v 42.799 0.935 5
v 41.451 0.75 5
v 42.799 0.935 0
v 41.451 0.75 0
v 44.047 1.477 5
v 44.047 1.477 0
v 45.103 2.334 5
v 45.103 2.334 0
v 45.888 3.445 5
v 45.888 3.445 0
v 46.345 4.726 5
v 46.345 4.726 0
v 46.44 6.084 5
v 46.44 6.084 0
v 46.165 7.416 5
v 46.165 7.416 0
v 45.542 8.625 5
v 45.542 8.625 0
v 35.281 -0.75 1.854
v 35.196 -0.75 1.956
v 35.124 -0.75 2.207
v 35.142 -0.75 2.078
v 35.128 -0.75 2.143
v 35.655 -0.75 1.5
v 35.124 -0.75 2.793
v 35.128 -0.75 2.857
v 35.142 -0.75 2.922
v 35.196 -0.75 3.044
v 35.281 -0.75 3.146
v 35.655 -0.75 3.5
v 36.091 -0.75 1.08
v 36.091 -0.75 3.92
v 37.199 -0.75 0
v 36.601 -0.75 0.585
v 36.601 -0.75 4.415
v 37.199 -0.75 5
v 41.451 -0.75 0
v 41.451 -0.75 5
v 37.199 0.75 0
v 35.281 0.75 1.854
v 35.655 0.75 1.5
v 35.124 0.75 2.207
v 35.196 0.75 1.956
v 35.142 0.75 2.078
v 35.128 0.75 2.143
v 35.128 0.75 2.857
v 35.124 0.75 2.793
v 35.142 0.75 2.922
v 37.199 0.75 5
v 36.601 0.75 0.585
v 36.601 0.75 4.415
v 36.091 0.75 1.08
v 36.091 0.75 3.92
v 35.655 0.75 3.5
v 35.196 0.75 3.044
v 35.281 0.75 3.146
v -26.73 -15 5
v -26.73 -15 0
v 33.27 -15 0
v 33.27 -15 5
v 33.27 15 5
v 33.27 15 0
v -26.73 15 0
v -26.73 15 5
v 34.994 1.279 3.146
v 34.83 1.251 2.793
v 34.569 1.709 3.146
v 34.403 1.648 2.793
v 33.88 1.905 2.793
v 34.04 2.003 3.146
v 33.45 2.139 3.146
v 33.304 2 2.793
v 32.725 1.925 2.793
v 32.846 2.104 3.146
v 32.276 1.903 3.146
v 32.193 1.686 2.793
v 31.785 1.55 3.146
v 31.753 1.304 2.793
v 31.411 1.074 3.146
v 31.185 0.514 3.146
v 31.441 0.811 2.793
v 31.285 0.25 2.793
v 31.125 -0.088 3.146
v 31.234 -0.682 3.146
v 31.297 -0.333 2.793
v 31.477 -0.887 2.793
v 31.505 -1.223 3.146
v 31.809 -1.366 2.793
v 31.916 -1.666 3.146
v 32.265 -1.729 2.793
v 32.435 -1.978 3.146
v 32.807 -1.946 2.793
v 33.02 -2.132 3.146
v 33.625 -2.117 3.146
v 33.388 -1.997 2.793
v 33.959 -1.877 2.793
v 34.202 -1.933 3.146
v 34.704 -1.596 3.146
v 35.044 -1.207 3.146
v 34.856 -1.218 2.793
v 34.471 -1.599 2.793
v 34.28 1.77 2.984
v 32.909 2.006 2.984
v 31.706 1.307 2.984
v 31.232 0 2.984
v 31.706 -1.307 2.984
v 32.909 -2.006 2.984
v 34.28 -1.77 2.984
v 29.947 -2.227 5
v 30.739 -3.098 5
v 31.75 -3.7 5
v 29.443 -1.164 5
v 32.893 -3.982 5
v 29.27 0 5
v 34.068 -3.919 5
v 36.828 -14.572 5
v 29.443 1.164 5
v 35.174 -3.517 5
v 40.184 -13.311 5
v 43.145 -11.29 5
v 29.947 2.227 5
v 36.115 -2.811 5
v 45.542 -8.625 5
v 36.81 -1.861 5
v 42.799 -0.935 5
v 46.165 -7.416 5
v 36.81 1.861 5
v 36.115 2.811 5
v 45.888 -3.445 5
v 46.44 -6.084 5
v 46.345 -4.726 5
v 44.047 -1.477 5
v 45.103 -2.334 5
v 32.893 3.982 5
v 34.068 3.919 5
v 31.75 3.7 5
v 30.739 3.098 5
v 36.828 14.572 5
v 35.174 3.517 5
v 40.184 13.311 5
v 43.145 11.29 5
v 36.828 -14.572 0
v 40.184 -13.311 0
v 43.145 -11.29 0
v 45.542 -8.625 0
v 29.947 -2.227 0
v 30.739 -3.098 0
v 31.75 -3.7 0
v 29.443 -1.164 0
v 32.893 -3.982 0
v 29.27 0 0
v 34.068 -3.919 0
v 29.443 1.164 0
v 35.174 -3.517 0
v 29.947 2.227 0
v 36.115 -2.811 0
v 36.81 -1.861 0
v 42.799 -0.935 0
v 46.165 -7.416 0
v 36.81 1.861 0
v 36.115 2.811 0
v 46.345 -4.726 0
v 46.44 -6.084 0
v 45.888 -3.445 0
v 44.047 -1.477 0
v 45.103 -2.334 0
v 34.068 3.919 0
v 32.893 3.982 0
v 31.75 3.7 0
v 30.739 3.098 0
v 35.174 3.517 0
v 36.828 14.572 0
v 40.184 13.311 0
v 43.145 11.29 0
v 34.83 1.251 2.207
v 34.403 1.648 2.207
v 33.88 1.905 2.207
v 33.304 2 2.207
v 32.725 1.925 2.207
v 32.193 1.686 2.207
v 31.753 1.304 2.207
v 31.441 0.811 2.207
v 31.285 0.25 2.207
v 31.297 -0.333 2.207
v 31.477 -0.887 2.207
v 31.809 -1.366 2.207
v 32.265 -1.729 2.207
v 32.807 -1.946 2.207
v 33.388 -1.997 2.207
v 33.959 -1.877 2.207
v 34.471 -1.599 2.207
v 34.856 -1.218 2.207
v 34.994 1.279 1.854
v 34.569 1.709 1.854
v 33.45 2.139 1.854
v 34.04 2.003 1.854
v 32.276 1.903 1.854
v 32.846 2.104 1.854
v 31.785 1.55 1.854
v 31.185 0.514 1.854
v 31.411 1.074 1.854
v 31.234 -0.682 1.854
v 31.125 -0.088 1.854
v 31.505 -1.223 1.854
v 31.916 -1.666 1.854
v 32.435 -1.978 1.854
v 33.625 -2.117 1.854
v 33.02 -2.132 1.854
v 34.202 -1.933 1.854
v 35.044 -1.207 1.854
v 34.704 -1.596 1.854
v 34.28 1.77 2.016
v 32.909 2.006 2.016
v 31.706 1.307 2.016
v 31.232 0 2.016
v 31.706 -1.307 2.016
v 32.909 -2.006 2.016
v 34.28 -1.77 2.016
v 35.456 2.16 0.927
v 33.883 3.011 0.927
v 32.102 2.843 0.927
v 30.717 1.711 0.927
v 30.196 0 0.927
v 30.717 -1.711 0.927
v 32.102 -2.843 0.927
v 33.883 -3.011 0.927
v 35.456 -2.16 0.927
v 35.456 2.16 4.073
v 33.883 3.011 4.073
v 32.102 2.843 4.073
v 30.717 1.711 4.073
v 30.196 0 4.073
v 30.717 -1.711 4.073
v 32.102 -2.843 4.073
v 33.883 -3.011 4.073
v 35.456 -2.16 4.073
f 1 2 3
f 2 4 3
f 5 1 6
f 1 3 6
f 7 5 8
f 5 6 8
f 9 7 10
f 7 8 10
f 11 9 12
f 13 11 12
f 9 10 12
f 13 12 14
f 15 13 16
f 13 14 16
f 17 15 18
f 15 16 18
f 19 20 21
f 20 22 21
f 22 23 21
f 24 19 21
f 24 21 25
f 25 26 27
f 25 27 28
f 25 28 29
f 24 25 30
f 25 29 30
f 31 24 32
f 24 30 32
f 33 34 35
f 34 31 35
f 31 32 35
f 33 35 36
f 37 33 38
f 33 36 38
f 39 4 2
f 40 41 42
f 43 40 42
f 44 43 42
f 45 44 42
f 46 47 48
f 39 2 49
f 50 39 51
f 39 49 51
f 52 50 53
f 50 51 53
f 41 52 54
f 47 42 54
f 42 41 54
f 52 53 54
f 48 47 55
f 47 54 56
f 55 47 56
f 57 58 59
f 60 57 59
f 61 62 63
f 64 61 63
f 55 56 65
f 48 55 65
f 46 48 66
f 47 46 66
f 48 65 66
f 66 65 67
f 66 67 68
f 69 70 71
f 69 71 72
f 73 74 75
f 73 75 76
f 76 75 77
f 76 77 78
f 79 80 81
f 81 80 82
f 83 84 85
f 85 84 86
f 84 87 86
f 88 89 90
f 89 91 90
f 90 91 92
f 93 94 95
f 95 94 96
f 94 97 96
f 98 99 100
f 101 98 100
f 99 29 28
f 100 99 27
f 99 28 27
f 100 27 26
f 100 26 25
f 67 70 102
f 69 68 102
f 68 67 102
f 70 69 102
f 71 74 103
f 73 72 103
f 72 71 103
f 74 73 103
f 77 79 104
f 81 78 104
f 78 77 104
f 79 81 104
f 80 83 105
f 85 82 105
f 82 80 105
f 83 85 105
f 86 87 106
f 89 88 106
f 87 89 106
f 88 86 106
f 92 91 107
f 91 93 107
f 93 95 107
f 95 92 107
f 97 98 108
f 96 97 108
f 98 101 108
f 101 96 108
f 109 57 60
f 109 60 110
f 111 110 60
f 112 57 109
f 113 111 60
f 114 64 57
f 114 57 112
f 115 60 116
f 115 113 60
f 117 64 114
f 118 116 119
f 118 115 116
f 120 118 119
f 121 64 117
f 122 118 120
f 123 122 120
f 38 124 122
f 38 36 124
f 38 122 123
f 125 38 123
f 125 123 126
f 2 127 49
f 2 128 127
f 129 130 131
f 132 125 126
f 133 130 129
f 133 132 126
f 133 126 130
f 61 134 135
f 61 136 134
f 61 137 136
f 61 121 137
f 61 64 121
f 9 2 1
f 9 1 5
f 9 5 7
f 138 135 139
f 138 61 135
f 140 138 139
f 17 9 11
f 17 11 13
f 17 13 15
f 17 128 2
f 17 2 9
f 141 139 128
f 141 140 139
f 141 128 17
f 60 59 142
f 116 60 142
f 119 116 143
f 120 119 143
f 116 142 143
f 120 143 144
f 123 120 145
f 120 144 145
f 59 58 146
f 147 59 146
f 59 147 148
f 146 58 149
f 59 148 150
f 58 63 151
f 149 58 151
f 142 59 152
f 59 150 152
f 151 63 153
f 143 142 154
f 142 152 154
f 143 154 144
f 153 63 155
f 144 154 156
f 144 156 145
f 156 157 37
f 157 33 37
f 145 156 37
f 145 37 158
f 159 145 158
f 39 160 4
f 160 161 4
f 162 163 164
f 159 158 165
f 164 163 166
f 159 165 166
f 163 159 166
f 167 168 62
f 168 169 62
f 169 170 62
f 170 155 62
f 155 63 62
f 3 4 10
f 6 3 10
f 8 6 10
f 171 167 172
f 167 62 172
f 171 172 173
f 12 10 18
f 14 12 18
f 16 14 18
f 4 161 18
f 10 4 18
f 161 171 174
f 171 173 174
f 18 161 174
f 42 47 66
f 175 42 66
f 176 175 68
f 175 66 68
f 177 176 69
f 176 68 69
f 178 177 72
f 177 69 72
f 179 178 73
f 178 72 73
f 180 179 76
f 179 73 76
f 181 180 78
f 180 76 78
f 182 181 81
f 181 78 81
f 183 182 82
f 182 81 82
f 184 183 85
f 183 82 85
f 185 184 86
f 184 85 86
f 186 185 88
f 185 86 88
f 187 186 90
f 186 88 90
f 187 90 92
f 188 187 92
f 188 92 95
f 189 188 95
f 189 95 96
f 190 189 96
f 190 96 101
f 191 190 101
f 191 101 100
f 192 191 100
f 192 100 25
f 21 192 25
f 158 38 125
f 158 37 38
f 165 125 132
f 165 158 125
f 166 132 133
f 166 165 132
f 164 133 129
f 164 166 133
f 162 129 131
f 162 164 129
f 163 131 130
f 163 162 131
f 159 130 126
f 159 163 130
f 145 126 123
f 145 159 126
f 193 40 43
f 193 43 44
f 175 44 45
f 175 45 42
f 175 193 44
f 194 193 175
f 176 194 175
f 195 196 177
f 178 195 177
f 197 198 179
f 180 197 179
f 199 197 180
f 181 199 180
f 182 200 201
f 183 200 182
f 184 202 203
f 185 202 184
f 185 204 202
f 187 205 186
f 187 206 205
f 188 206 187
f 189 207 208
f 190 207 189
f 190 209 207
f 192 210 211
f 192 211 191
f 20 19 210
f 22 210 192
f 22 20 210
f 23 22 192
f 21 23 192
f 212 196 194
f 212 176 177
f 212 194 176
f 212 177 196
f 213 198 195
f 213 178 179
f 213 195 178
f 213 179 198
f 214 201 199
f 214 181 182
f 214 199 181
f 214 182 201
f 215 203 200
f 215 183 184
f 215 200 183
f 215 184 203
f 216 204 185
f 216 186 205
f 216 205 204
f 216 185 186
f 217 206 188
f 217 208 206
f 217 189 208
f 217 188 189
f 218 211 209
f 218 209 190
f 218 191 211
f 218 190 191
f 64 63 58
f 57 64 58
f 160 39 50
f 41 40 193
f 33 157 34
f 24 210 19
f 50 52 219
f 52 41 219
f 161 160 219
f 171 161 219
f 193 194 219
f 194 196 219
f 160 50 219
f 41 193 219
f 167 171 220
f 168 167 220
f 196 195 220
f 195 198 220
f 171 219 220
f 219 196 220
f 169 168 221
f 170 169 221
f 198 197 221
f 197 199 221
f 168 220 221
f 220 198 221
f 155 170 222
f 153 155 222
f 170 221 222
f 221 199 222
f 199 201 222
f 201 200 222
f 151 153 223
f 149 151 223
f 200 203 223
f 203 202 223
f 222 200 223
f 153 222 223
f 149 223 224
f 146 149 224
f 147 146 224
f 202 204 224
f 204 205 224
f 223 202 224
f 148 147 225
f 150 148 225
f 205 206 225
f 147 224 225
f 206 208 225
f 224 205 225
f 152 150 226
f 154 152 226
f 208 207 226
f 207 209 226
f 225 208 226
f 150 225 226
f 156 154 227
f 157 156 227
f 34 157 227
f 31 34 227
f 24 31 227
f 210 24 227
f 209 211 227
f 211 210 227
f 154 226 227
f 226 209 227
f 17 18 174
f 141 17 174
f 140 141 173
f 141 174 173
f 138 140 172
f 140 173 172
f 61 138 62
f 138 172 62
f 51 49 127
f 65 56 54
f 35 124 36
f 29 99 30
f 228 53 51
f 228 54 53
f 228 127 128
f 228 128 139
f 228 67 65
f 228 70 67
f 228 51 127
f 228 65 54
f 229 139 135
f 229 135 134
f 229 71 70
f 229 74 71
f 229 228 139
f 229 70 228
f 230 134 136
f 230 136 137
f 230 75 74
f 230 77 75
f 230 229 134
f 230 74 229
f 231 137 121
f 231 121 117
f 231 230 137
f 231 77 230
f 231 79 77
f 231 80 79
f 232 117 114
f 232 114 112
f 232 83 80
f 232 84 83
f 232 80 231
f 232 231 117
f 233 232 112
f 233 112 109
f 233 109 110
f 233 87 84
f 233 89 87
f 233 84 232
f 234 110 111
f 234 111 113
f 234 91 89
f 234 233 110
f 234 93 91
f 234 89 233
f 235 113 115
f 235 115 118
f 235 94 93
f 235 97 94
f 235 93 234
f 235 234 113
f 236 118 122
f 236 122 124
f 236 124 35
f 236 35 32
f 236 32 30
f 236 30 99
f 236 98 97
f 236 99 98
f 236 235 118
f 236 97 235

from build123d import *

# Parameters (mm, degrees)
F1_DEPTH = 5
F3_DEPTH = 5.001
F4_SIZE  = 2
F5_R     = 0.5
F6_R     = 5


with BuildPart() as f1:
    # F0 (on Top) → F1 (new body)
    with BuildSketch(Plane.XY):
        with BuildLine():
            Line((-26.7304610461, 15), (-26.7304610461, 0))
            Line((-26.7304610461, 0), (-26.7304610461, -15))
            Line((-26.7304610461, -15), (33.2695389539, -15))
            ThreePointArc((33.2695389539, -15), (48.2695389539, 0), (33.2695389539, 15))
            Line((33.2695389539, 15), (-26.7304610461, 15))
        make_face()
    extrude(amount=F1_DEPTH)

    # F2 (on face) → F3 (cut, through all)
    with BuildSketch(Plane.XY.offset(5)):
        with BuildLine():
            Line((35.1235885757, -0.75), (48.2507772205, -0.75))
            ThreePointArc((48.2507772205, -0.75), (48.2695389539, 0), (48.2507772205, 0.75))
            Line((48.2507772205, 0.75), (35.1235885757, 0.75))
            ThreePointArc((35.1235885757, 0.75), (35.2327123089, 0.3820345249), (35.2695389539, 0))
            ThreePointArc((35.2695389539, 0), (35.2327123089, -0.3820345249), (35.1235885757, -0.75))
        make_face()
        with BuildLine():
            ThreePointArc((35.1235885757, 0.75), (31.2695389539, 0), (35.1235885757, -0.75))
            Line((35.1235885757, -0.75), (33.2695389539, -0.75))
            Line((33.2695389539, -0.75), (33.2695389539, 0.75))
            Line((33.2695389539, 0.75), (35.1235885757, 0.75))
        make_face()
        with BuildLine():
            Line((33.2695389539, -0.75), (35.1235885757, -0.75))
            ThreePointArc((35.1235885757, -0.75), (35.2327123089, -0.3820345249), (35.2695389539, 0))
            ThreePointArc((35.2695389539, 0), (35.2327123089, 0.3820345249), (35.1235885757, 0.75))
            Line((35.1235885757, 0.75), (33.2695389539, 0.75))
            Line((33.2695389539, 0.75), (33.2695389539, -0.75))
        make_face()
    extrude(amount=-F3_DEPTH, mode=Mode.SUBTRACT)

    # F4
    f4_edges = [f1.edges().sort_by_distance(p)[0] for p in [
        (31.269539, 0, 5),
        (31.269539, 0, 0),
    ]]
    chamfer(f4_edges, length=F4_SIZE)

    # F5
    f5_edges = [f1.edges().sort_by_distance(p)[0] for p in [
        (31.269539, 0, 3),
        (31.269539, 0, 2),
    ]]
    fillet(f5_edges, radius=F5_R)

    # F6
    f6_edges = [f1.edges().sort_by_distance(p)[0] for p in [
        (48.250777, 0.75, 2.5),
        (48.250777, -0.75, 2.5),
    ]]
    fillet(f6_edges, radius=F6_R)


solid = f1.part
